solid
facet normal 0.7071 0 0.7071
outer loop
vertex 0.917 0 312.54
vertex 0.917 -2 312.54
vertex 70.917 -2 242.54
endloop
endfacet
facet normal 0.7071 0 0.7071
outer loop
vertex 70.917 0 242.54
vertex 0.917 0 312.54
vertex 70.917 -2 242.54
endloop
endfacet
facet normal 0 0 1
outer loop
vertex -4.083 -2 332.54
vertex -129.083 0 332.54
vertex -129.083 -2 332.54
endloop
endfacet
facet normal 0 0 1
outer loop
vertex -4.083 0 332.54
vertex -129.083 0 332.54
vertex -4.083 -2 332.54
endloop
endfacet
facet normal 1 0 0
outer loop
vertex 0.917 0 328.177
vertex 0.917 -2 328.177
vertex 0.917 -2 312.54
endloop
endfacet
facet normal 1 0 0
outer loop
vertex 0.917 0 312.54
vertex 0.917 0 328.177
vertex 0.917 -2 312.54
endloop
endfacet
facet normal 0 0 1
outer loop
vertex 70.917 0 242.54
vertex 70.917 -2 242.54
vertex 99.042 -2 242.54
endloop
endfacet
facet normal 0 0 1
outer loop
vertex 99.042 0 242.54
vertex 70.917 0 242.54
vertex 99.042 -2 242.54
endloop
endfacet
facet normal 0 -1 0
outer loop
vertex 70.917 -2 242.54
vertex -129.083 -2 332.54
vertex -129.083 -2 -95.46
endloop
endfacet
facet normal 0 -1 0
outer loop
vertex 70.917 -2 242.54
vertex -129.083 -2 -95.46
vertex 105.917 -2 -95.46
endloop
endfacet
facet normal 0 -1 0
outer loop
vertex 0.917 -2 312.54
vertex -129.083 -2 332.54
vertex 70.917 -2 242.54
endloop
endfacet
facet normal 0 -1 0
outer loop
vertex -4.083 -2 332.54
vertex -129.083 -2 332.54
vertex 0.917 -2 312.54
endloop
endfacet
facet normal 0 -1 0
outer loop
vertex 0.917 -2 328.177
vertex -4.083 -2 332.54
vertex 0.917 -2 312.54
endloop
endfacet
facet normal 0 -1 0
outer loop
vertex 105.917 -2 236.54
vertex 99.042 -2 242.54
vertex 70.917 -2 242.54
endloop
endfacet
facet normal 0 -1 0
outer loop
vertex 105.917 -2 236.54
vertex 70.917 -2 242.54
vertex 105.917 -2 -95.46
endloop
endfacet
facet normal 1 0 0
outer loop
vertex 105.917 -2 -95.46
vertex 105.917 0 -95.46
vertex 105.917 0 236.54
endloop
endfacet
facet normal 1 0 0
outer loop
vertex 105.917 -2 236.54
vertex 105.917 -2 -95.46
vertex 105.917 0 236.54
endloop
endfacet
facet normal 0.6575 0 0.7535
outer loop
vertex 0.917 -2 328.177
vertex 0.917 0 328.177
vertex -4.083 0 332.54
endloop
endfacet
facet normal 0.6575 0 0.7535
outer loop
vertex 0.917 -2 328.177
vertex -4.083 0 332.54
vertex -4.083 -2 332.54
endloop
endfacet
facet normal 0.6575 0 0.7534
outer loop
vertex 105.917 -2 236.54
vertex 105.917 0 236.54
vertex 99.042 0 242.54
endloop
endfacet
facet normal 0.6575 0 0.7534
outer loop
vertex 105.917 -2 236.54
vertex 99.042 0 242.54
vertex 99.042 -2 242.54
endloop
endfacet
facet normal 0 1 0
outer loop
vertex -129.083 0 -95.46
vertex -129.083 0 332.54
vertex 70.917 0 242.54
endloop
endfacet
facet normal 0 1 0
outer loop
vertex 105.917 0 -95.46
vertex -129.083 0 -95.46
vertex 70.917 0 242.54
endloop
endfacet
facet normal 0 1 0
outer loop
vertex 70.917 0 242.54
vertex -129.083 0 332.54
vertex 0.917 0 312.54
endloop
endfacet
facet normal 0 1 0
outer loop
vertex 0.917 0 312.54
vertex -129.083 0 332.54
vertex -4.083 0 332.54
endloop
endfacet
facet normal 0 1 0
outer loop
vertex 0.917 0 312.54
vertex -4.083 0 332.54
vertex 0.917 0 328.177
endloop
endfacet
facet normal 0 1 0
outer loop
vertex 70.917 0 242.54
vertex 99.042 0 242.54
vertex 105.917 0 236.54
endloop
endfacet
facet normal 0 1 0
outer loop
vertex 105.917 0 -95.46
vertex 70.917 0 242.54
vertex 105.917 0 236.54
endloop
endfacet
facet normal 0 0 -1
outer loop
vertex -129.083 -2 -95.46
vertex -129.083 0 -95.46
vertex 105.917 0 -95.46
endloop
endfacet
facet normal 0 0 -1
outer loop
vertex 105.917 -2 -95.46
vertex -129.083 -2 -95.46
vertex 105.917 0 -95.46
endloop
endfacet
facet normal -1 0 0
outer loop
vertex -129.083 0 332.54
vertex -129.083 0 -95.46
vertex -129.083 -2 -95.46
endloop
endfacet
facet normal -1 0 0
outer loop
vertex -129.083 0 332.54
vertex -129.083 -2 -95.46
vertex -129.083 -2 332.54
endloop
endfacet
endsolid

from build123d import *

# Parameters (mm, degrees)
F0_W     = 235
F0_H     = 428
F1_DEPTH = 2
F2_SIZE2 = 96
F2_SIZE  = 110
F4_DEPTH = 25


with BuildPart() as f1:
    # F0 (on Front) → F1 (new body)
    with BuildSketch(Plane.XZ):
        with Locations((-11.5827983245, 118.5401997186)):
            Rectangle(F0_W, F0_H)
    extrude(amount=F1_DEPTH)

    # F2
    f2_edges = [f1.edges().sort_by_distance(p)[0] for p in [
        (105.917202, -1, 332.5402),
    ]]
    f2_side = f1.faces().sort_by_distance((-11.582798, -1, 332.5402))[0]
    chamfer(f2_edges, length=F2_SIZE, length2=F2_SIZE2, reference=f2_side)

    # F3 (on face) → F4 (cut)
    with BuildSketch(Plane.XZ.offset(2)):
        Polygon((99.0422016755, 242.5401997186), (0.9172016755, 328.176563355), (0.9172016755, 312.5401997186), (70.9172016755, 242.5401997186), align=None)
    extrude(amount=-F4_DEPTH, mode=Mode.SUBTRACT)


solid = f1.part
